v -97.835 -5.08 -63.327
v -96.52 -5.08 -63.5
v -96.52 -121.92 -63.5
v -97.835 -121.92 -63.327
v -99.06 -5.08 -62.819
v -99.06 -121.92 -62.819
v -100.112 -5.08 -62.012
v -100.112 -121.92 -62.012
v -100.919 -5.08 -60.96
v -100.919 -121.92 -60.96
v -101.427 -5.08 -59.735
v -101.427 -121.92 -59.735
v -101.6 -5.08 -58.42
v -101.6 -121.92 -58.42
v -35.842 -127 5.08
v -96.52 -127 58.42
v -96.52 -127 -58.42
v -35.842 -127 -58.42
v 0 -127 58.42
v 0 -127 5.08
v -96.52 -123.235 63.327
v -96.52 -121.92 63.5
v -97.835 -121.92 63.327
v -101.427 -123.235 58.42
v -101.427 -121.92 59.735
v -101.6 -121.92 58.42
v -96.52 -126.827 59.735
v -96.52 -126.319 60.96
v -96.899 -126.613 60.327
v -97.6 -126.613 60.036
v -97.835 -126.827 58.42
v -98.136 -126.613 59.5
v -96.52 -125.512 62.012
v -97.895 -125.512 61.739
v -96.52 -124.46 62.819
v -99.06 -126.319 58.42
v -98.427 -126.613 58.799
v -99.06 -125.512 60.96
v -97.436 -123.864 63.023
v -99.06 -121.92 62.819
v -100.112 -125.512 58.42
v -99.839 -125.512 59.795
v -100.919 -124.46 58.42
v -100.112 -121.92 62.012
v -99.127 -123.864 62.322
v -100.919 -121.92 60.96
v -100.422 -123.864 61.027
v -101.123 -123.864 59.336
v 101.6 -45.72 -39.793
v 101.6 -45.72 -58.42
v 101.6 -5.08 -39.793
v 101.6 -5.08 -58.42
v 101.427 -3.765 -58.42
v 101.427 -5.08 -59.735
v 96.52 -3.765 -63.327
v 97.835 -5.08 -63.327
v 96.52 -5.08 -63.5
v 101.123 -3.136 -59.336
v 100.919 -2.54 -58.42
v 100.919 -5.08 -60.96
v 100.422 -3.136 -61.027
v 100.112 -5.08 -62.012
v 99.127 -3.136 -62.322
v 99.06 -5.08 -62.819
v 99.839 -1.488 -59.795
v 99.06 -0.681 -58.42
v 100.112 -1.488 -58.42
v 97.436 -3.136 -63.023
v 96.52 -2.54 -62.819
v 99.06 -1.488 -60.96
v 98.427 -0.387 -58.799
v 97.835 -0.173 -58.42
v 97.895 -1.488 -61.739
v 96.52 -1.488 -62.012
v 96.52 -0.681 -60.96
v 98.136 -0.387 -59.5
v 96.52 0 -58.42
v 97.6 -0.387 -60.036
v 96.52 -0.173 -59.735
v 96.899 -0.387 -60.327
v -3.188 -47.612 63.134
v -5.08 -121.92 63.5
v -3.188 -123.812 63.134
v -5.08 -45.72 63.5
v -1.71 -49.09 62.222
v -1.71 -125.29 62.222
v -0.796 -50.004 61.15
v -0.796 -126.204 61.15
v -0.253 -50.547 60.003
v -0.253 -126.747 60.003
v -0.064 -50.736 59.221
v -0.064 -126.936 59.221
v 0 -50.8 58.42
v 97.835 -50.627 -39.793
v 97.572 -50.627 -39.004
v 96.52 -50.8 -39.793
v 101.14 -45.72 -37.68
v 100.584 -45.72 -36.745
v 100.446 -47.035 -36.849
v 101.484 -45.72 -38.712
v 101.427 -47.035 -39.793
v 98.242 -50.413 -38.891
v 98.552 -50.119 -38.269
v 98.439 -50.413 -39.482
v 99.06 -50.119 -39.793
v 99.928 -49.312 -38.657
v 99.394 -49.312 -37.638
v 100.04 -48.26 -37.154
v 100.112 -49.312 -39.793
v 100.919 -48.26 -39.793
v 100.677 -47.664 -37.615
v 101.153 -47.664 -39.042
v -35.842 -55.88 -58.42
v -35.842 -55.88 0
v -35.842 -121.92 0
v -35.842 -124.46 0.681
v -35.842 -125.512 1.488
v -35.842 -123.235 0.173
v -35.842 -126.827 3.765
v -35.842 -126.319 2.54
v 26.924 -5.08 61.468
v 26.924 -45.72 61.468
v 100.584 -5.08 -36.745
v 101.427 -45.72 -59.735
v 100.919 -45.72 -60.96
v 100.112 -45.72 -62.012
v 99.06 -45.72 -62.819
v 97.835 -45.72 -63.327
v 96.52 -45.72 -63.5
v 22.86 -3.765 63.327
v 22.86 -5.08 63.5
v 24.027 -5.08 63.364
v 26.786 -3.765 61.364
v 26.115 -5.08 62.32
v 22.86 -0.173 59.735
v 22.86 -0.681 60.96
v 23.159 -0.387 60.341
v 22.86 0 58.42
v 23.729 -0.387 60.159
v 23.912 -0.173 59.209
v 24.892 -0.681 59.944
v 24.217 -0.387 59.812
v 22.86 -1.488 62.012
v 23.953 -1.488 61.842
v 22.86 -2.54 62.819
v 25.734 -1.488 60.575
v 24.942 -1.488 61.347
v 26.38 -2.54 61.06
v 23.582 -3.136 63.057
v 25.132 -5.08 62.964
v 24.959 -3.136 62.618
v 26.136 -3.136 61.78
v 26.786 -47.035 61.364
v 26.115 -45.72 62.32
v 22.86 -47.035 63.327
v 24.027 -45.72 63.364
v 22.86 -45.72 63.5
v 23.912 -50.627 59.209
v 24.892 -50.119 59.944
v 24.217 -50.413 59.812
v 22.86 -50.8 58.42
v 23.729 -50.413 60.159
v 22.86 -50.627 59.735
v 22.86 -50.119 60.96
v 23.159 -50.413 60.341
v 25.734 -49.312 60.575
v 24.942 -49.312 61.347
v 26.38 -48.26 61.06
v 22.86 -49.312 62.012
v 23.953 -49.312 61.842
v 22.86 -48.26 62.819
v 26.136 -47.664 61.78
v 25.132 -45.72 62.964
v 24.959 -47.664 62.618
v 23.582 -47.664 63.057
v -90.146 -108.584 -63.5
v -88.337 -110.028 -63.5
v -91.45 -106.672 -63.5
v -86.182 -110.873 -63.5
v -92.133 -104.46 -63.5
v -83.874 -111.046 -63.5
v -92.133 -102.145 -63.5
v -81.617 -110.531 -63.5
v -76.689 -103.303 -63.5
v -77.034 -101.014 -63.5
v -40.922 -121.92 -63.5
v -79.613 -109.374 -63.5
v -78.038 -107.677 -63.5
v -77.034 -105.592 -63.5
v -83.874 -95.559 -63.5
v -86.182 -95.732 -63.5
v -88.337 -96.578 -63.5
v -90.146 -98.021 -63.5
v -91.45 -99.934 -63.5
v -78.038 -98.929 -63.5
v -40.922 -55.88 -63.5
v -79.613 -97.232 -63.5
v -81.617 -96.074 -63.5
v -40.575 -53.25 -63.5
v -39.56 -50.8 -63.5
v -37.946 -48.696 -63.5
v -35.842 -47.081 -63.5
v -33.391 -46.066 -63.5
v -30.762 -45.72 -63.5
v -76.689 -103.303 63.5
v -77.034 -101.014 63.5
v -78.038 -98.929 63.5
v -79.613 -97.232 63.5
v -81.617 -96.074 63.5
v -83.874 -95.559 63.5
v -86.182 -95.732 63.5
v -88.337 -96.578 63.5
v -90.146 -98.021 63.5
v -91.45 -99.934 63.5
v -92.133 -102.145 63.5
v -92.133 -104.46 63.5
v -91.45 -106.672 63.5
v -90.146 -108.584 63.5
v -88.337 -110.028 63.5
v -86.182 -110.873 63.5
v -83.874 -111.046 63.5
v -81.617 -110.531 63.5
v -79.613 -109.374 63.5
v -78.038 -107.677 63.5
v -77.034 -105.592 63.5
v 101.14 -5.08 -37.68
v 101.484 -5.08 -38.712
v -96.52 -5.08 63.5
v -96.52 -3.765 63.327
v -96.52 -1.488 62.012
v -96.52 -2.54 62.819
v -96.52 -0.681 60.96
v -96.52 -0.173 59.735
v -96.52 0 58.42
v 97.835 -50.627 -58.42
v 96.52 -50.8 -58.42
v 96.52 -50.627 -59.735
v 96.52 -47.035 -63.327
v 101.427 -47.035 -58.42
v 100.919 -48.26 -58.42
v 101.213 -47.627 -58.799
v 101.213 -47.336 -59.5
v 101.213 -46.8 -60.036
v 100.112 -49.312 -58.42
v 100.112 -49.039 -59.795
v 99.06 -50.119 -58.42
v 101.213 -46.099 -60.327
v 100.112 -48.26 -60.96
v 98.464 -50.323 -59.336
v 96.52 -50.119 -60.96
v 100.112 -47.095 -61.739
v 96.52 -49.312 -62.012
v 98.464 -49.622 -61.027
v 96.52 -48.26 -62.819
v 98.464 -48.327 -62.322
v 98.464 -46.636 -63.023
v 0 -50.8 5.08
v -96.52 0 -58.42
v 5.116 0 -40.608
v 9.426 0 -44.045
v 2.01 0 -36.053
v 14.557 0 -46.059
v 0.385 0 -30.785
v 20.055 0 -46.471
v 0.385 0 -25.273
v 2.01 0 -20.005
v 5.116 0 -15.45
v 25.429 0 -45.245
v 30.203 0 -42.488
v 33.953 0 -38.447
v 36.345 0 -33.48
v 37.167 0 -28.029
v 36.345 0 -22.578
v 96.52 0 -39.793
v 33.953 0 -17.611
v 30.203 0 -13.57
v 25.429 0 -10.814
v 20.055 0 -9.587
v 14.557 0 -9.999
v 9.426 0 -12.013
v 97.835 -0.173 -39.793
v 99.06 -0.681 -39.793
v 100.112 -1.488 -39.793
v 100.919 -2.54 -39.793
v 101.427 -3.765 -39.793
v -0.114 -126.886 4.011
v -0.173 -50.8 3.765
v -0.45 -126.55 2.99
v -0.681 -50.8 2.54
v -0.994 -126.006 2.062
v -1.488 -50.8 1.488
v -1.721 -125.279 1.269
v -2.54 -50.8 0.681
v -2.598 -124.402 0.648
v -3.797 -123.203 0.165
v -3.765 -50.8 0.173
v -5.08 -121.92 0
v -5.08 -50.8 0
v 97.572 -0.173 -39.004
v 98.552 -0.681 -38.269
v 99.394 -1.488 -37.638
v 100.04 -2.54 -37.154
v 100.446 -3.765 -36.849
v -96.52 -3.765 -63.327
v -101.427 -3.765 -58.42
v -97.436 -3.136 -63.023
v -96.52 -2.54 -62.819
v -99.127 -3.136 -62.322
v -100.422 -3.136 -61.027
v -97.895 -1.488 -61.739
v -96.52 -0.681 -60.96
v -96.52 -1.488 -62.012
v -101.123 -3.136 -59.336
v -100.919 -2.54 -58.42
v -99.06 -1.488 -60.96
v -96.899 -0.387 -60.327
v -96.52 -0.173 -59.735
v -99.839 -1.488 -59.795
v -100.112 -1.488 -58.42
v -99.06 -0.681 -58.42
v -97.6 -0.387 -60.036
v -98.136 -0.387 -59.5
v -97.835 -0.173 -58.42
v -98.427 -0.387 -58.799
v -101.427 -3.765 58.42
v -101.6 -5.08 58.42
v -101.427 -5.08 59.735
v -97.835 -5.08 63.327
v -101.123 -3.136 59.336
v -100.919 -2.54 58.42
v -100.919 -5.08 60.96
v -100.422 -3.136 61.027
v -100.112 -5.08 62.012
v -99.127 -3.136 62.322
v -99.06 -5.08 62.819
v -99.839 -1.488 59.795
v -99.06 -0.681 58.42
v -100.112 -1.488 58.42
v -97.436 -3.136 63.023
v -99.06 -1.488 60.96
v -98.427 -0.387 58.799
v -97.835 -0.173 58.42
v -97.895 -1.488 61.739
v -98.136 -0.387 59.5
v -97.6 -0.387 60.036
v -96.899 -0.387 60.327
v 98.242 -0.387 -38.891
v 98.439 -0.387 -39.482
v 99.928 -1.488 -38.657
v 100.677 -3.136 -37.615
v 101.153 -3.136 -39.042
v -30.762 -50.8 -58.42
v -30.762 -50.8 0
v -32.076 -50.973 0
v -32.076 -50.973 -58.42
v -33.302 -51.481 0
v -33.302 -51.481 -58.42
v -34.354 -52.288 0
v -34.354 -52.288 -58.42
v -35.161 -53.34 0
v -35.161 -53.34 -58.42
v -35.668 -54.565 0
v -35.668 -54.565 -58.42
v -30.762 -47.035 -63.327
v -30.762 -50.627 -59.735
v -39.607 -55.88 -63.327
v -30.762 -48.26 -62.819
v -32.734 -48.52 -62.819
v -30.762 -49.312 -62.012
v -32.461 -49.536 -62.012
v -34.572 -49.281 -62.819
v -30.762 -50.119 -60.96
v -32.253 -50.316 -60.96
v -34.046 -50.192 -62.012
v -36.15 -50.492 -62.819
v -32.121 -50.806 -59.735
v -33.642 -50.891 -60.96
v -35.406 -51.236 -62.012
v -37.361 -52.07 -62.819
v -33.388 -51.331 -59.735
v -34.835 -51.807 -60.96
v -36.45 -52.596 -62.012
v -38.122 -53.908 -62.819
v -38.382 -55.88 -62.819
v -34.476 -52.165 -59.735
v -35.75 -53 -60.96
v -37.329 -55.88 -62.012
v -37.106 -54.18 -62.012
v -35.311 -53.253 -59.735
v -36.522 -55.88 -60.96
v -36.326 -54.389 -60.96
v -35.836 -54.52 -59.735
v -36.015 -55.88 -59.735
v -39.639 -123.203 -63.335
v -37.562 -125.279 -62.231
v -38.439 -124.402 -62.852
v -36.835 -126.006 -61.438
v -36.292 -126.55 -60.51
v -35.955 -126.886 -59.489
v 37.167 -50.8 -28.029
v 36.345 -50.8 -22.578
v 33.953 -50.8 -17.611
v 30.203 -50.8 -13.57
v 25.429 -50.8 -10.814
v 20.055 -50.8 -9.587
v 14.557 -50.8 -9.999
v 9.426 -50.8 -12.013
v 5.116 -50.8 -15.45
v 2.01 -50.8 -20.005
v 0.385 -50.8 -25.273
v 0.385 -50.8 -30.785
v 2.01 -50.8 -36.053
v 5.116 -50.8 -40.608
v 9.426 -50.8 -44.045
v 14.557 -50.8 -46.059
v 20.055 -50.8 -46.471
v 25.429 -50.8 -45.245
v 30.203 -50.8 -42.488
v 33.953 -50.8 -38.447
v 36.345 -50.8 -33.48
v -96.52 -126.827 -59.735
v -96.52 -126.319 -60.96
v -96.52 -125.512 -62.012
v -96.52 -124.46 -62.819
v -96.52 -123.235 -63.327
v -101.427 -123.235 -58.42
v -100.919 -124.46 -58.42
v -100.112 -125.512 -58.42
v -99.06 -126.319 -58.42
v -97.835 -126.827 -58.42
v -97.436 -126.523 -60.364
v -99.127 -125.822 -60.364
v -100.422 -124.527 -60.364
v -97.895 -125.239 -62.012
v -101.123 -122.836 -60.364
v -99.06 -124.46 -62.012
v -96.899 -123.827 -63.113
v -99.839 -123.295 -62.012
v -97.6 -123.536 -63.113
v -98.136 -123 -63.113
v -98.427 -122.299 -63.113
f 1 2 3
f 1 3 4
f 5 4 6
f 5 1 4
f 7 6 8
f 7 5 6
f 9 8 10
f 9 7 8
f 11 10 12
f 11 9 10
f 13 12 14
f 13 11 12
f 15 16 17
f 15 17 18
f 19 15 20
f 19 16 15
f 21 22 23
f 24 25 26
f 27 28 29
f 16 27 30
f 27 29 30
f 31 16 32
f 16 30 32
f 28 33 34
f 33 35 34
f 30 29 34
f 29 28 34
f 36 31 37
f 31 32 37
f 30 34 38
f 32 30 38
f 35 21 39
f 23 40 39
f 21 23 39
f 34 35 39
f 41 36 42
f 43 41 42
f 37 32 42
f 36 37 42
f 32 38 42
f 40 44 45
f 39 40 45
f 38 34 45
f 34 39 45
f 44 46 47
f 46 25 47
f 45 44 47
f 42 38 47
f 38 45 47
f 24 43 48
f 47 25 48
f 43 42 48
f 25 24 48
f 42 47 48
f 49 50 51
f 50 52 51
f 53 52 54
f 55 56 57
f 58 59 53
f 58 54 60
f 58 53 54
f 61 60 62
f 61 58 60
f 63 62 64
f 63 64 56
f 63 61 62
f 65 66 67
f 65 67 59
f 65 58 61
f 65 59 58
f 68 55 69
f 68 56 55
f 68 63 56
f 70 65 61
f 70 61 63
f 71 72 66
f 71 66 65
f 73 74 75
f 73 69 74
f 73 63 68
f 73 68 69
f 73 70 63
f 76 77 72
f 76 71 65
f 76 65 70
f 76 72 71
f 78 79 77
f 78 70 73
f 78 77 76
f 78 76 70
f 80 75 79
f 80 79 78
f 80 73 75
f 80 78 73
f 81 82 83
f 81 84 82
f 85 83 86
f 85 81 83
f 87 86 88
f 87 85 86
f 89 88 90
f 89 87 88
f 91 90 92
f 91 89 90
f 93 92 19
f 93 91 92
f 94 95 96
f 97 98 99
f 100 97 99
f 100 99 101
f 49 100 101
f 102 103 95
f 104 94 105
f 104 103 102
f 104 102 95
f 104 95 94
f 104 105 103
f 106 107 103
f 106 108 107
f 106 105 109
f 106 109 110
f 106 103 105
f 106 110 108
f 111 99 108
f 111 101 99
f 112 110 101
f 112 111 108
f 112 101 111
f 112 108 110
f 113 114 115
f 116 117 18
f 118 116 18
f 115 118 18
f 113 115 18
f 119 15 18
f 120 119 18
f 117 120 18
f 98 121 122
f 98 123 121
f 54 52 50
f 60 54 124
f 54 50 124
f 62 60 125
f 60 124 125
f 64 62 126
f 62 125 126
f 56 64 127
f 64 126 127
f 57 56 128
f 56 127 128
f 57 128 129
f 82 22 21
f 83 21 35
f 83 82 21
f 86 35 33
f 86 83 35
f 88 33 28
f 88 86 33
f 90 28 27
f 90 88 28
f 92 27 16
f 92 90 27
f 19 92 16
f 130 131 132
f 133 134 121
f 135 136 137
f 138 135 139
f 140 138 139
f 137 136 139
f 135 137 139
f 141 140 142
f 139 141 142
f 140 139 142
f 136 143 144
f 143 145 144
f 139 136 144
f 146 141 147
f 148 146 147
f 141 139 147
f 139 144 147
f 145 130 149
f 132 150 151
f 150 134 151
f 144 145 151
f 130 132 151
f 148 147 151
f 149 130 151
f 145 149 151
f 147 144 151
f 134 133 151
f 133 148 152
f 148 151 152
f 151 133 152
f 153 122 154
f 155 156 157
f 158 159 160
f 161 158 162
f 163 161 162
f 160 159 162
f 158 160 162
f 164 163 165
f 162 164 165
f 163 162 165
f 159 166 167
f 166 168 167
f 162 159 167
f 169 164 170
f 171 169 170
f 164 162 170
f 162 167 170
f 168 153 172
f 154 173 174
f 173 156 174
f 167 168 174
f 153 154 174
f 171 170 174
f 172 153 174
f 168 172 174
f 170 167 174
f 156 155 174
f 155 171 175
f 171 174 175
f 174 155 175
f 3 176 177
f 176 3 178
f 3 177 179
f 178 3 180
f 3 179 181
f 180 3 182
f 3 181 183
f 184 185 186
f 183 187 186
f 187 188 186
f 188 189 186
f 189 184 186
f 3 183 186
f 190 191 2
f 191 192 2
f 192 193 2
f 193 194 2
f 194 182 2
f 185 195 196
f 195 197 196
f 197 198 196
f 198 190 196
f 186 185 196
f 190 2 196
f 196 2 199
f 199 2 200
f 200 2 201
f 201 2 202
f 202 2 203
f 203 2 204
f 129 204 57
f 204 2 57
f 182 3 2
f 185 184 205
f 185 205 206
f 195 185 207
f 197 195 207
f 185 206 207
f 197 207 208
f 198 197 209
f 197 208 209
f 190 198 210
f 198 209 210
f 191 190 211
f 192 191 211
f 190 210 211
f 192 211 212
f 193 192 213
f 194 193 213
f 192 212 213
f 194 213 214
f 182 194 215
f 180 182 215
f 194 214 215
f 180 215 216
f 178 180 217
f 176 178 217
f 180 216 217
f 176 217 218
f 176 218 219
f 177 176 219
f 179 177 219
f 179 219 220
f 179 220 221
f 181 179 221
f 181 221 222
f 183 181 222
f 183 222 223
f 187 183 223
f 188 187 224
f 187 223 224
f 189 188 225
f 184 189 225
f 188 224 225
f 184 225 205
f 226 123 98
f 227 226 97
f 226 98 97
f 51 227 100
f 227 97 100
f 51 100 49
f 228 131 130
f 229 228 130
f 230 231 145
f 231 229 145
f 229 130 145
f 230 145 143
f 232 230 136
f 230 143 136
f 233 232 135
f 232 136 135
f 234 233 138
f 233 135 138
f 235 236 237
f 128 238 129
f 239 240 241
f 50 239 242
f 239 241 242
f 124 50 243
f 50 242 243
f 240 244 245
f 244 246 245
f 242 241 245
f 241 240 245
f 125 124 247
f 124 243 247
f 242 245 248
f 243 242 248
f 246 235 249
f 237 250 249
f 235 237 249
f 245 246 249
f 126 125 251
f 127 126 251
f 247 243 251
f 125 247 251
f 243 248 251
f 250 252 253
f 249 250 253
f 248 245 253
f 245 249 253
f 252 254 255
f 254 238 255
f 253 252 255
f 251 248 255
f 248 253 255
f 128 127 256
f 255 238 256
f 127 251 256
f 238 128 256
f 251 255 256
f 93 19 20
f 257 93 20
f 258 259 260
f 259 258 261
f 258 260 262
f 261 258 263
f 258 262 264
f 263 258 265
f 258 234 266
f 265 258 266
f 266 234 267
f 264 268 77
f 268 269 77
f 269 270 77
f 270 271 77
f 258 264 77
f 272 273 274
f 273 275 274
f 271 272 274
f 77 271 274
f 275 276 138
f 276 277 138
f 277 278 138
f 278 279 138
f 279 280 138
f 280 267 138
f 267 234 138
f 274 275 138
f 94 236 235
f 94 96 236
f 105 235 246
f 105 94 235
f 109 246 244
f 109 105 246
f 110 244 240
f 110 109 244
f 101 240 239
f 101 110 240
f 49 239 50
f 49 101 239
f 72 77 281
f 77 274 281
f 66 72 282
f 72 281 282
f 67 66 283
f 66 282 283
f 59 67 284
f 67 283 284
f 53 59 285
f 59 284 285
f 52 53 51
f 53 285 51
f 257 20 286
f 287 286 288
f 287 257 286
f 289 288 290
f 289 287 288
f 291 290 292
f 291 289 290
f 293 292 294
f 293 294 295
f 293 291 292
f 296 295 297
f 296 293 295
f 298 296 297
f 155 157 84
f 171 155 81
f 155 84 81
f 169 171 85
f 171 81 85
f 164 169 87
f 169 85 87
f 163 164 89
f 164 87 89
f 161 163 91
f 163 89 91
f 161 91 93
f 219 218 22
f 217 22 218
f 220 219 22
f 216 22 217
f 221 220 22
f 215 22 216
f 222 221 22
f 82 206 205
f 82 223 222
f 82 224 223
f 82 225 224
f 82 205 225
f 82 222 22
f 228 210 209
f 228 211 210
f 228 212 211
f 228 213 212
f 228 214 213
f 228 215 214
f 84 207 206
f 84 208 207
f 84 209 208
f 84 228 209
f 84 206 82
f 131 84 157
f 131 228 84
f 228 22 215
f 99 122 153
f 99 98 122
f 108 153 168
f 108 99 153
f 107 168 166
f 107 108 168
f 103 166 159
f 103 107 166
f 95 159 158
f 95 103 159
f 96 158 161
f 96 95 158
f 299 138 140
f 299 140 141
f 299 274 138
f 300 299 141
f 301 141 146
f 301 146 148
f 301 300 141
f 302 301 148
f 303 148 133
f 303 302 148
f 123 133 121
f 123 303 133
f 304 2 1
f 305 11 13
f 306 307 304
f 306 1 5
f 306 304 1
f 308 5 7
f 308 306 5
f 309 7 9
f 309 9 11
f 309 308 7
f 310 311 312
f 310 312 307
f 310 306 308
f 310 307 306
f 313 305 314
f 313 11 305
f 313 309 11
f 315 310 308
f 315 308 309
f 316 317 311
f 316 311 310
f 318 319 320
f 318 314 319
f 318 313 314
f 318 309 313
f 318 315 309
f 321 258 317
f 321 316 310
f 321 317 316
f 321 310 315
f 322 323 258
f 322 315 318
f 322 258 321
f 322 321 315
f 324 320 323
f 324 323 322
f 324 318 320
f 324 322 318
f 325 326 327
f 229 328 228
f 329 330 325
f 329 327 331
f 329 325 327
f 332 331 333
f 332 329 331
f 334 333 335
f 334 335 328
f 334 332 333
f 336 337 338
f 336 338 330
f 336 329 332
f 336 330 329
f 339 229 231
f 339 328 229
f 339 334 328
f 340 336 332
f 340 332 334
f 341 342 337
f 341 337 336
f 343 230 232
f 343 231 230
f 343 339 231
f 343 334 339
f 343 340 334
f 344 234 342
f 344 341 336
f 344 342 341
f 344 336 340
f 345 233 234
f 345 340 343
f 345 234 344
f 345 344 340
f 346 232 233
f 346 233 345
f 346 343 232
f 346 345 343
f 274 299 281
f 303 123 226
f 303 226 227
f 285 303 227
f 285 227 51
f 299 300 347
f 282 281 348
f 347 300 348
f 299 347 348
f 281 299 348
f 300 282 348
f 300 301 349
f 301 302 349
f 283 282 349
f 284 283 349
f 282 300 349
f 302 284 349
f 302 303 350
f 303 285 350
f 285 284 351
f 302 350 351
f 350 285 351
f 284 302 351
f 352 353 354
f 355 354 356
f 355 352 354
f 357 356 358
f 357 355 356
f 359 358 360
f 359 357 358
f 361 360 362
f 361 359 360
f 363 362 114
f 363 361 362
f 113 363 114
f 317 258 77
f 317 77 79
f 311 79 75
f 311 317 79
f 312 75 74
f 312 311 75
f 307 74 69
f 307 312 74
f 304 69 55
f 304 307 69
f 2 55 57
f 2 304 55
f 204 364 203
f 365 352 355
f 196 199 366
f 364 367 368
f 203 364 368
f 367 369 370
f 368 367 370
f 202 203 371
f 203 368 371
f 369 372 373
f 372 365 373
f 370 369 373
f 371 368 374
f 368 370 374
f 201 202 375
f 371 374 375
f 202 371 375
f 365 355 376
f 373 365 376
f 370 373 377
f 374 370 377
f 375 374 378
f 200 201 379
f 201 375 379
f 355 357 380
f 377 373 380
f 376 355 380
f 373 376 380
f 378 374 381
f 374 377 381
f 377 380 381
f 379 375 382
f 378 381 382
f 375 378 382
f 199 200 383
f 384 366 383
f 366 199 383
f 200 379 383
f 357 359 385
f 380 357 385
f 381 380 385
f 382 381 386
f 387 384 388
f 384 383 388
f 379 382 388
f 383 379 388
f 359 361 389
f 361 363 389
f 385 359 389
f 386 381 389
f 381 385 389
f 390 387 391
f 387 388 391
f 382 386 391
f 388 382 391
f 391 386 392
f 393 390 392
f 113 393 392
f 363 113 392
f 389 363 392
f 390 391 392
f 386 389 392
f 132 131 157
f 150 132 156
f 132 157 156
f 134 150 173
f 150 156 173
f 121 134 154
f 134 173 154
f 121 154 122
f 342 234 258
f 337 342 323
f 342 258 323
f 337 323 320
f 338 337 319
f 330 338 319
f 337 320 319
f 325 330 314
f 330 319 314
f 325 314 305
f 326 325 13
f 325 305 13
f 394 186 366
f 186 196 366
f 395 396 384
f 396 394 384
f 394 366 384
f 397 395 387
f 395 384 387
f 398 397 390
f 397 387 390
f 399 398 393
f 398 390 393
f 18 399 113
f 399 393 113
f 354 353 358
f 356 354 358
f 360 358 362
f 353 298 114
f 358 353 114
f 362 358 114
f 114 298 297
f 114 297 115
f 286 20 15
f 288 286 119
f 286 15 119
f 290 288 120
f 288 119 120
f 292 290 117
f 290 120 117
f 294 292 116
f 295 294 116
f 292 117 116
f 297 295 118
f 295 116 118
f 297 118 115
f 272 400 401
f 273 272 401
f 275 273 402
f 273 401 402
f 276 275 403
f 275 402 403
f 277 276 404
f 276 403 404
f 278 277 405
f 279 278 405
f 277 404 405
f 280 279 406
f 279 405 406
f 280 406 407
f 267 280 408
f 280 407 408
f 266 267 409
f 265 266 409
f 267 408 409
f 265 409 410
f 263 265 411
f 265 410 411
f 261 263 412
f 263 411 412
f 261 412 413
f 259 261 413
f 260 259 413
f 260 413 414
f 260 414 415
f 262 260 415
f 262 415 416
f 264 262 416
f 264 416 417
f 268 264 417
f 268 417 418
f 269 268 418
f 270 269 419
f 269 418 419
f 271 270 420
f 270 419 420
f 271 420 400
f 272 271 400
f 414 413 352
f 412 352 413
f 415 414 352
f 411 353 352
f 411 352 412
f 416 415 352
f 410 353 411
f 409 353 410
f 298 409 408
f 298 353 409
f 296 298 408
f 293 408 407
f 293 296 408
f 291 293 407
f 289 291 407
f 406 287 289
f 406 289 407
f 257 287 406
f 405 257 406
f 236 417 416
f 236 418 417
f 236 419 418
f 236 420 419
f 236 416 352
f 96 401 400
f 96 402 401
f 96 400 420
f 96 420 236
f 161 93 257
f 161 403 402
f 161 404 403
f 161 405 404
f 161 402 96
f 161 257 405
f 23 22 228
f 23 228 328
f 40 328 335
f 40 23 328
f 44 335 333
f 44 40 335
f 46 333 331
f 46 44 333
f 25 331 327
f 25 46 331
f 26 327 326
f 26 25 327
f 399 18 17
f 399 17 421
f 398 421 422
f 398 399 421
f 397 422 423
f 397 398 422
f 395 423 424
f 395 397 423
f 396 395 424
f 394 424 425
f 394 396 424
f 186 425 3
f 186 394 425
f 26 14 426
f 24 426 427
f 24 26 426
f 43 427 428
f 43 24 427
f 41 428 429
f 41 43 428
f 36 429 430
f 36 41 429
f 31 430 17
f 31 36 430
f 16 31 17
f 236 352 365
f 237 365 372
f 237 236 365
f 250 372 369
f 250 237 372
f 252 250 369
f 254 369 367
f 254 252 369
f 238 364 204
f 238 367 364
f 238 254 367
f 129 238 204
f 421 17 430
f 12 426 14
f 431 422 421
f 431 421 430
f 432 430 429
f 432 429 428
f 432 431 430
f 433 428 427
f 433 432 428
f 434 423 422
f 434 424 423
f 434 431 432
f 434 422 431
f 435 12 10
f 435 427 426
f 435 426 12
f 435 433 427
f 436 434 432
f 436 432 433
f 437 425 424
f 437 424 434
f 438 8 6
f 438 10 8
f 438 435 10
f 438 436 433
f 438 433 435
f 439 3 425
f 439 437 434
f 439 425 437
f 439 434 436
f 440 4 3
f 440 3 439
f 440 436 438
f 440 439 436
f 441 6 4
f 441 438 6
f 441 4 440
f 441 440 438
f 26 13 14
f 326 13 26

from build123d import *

# Parameters (mm, degrees)
F0_W         = 203.2
F0_H         = 127
F1_DEPTH     = 127
F3_DEPTH     = 76.2
F4_SIZE2     = 101.6
F4_SIZE      = 76.2
F5_R         = 5.08
F6_T1_DEPTH  = 116.84
F6_T3_DEPTH  = 116.84
F6_T5_DEPTH  = 193.04
F6_S9_W      = 5.08
F6_S9_H      = 5.08
F6_T10_DEPTH = 5.08
F6_S15_W     = 5.08
F6_S15_H     = 5.08
F6_T16_DEPTH = 5.08
F6_S21_W     = 5.08
F6_S21_H     = 5.08
F6_T22_DEPTH = 5.08
F6_S27_W     = 5.08
F6_S27_H     = 5.08
F6_T28_DEPTH = 5.08
F7_R         = 18.4939106261
F8_DEPTH     = 50.8
F9_R         = 7.7650869993
F10_DEPTH    = 127


# Not quite as in the source:
# - a fillet or chamfer that OpenCascade refuses, or shapes differently, is made with other operations: its cross-section is extruded or revolved along the edge and cut away or added


with BuildPart() as f1:
    # F0 (on Front) → F1 (new body)
    with BuildSketch(Plane.XZ):
        Rectangle(F0_W, F0_H)
    extrude(amount=F1_DEPTH)

    # F2 (on face) → F3 (cut)
    with BuildSketch(Plane.XZ.offset(127)):
        Polygon((101.6, 63.5), (0, 63.5), (0, 0), (-35.8415916562, 0), (-35.8415916562, -63.5), (101.6, -63.5), align=None)
    extrude(amount=-F3_DEPTH, mode=Mode.SUBTRACT)

    # F4
    f4_edges = [f1.edges().sort_by_distance(p)[0] for p in [
        (101.6, -25.4, 63.5),
    ]]
    f4_side = f1.faces().sort_by_distance((-21.771429, -52.614286, 63.5))[0]
    chamfer(f4_edges, length=F4_SIZE, length2=F4_SIZE2, reference=f4_side)

    # F5
    f5_edges = [f1.edges().sort_by_distance(p)[0] for p in [
        (-101.6, -63.5, 63.5),
        (-50.8, -127, 63.5),
        (0, -88.9, 63.5),
        (12.7, -50.8, 63.5),
        (25.4, -25.4, 63.5),
        (-38.1, 0, 63.5),
        (-17.920796, -127, 0),
        (0, -88.9, 0),
        (-101.6, -127, 0),
        (-68.720796, -127, -63.5),
        (-35.841592, -88.9, -63.5),
        (-35.841592, -50.8, -31.75),
        (32.879204, -50.8, -63.5),
        (101.6, -50.8, -50.8),
        (101.6, -25.4, -63.5),
        (101.6, 0, -50.8),
        (101.6, -25.4, -38.1),
        (63.5, -50.8, 12.7),
        (63.5, 0, 12.7),
    ]]
    fillet(f5_edges, radius=F5_R)

    # F6: fillet of radius 5.08 on 3 edges, made by hand

    # F6_s2 → F6_t1 (cut)
    with BuildSketch(Plane.XZ.offset(5.08)):
        with BuildLine():
            ThreePointArc((-96.52, -63.5), (-100.1121024484, -62.0121024484), (-101.6, -58.42))
            Line((-101.6, -58.42), (-101.6, -63.5))
            Line((-101.6, -63.5), (-96.52, -63.5))
        make_face()
    extrude(amount=F6_T1_DEPTH, mode=Mode.SUBTRACT)

    # F6_s4 → F6_t3 (cut)
    with BuildSketch(Plane.XY.offset(-58.42)):
        with BuildLine():
            ThreePointArc((-96.52, 0), (-100.1121024484, -1.4878975516), (-101.6, -5.08))
            Line((-101.6, -5.08), (-101.6, 0))
            Line((-101.6, 0), (-96.52, 0))
        make_face()
    extrude(amount=F6_T3_DEPTH, mode=Mode.SUBTRACT)

    # F6_s6 → F6_t5 (cut)
    with BuildSketch(Plane.YZ.offset(-96.52)):
        with BuildLine():
            ThreePointArc((0, -58.42), (-1.4878975516, -62.0121024484), (-5.08, -63.5))
            Line((-5.08, -63.5), (0, -63.5))
            Line((0, -63.5), (0, -58.42))
        make_face()
    extrude(amount=F6_T5_DEPTH, mode=Mode.SUBTRACT)


with BuildPart() as f6_tool8:
    # F6_s9 → F6_t10 (new body)
    with BuildSketch(Plane.XZ.offset(5.08)):
        with Locations((99.06, -60.96)):
            Rectangle(F6_S9_W, F6_S9_H)
    extrude(amount=-F6_T10_DEPTH)

    # F6_s11 → F6_t12 (revolve, cut)
    with BuildSketch(Plane(origin=(96.52, -5.08, -58.42), x_dir=(-0.7071067812, 0, 0.7071067812), z_dir=(-0.7071067812, 0, -0.7071067812))):
        with BuildLine():
            ThreePointArc((0, -5.08), (5.08, 0), (0, 5.08))
            Line((0, 5.08), (0, -5.08))
        make_face()
    revolve(axis=Axis((96.52, -5.08, -58.42), (0, 1, 0)), mode=Mode.SUBTRACT)


with BuildPart() as f1_1:
    add(f1.part)

    # F6_t7: cut F6_tool8
    add(f6_tool8.part, mode=Mode.SUBTRACT)


with BuildPart() as f6_tool14:
    # F6_s15 → F6_t16 (new body)
    with BuildSketch(Plane.XZ.offset(5.08)):
        with Locations((-99.06, 60.96)):
            Rectangle(F6_S15_W, F6_S15_H)
    extrude(amount=-F6_T16_DEPTH)

    # F6_s17 → F6_t18 (revolve, cut)
    with BuildSketch(Plane(origin=(-96.52, -5.08, 58.42), x_dir=(0.7071067812, 0, -0.7071067812), z_dir=(0.7071067812, 0, 0.7071067812))):
        with BuildLine():
            ThreePointArc((0, -5.08), (5.08, 0), (0, 5.08))
            Line((0, 5.08), (0, -5.08))
        make_face()
    revolve(axis=Axis((-96.52, -5.08, 58.42), (0, 1, 0)), mode=Mode.SUBTRACT)


with BuildPart() as f1_2:
    add(f1_1.part)

    # F6_t13: cut F6_tool14
    add(f6_tool14.part, mode=Mode.SUBTRACT)


with BuildPart() as f6_tool20:
    # F6_s21 → F6_t22 (new body)
    with BuildSketch(Plane.XY.offset(-58.42)):
        with Locations((-99.06, -124.46)):
            Rectangle(F6_S21_W, F6_S21_H)
    extrude(amount=-F6_T22_DEPTH)

    # F6_s23 → F6_t24 (revolve, cut)
    with BuildSketch(Plane(origin=(-96.52, -121.92, -58.42), x_dir=(0.7071067812, 0.7071067812, 0), z_dir=(-0.7071067812, 0.7071067812, 0))):
        with BuildLine():
            ThreePointArc((0, -5.08), (5.08, 0), (0, 5.08))
            Line((0, 5.08), (0, -5.08))
        make_face()
    revolve(axis=Axis((-96.52, -121.92, -58.42), (0, 0, -1)), mode=Mode.SUBTRACT)


with BuildPart() as f1_3:
    add(f1_2.part)

    # F6_t19: cut F6_tool20
    add(f6_tool20.part, mode=Mode.SUBTRACT)


with BuildPart() as f6_tool26:
    # F6_s27 → F6_t28 (new body)
    with BuildSketch(Plane.XZ.offset(5.08)):
        with Locations((-99.06, -60.96)):
            Rectangle(F6_S27_W, F6_S27_H)
    extrude(amount=-F6_T28_DEPTH)

    # F6_s29 → F6_t30 (revolve, cut)
    with BuildSketch(Plane(origin=(-96.52, -5.08, -58.42), x_dir=(0.7071067812, 0, 0.7071067812), z_dir=(-0.7071067812, 0, 0.7071067812))):
        with BuildLine():
            ThreePointArc((0, -5.08), (5.08, 0), (0, 5.08))
            Line((0, 5.08), (0, -5.08))
        make_face()
    revolve(axis=Axis((-96.52, -5.08, -58.42), (0, 1, 0)), mode=Mode.SUBTRACT)


with BuildPart() as f1_4:
    add(f1_3.part)

    # F6_t25: cut F6_tool26
    add(f6_tool26.part, mode=Mode.SUBTRACT)

    # F7 (on face) → F8 (cut, through all)
    with BuildSketch(Plane.XZ.offset(50.8)):
        with Locations((18.6727233231, -28.0290115625)):
            Circle(F7_R)
    extrude(amount=-F8_DEPTH, mode=Mode.SUBTRACT)

    # F9 (on face) → F10 (cut, through all)
    with BuildSketch(Plane.XY.offset(63.5)):
        with Locations((-84.4542831182, -103.3027470112)):
            Circle(F9_R)
    extrude(amount=-F10_DEPTH, mode=Mode.SUBTRACT)


solid = f1_4.part
